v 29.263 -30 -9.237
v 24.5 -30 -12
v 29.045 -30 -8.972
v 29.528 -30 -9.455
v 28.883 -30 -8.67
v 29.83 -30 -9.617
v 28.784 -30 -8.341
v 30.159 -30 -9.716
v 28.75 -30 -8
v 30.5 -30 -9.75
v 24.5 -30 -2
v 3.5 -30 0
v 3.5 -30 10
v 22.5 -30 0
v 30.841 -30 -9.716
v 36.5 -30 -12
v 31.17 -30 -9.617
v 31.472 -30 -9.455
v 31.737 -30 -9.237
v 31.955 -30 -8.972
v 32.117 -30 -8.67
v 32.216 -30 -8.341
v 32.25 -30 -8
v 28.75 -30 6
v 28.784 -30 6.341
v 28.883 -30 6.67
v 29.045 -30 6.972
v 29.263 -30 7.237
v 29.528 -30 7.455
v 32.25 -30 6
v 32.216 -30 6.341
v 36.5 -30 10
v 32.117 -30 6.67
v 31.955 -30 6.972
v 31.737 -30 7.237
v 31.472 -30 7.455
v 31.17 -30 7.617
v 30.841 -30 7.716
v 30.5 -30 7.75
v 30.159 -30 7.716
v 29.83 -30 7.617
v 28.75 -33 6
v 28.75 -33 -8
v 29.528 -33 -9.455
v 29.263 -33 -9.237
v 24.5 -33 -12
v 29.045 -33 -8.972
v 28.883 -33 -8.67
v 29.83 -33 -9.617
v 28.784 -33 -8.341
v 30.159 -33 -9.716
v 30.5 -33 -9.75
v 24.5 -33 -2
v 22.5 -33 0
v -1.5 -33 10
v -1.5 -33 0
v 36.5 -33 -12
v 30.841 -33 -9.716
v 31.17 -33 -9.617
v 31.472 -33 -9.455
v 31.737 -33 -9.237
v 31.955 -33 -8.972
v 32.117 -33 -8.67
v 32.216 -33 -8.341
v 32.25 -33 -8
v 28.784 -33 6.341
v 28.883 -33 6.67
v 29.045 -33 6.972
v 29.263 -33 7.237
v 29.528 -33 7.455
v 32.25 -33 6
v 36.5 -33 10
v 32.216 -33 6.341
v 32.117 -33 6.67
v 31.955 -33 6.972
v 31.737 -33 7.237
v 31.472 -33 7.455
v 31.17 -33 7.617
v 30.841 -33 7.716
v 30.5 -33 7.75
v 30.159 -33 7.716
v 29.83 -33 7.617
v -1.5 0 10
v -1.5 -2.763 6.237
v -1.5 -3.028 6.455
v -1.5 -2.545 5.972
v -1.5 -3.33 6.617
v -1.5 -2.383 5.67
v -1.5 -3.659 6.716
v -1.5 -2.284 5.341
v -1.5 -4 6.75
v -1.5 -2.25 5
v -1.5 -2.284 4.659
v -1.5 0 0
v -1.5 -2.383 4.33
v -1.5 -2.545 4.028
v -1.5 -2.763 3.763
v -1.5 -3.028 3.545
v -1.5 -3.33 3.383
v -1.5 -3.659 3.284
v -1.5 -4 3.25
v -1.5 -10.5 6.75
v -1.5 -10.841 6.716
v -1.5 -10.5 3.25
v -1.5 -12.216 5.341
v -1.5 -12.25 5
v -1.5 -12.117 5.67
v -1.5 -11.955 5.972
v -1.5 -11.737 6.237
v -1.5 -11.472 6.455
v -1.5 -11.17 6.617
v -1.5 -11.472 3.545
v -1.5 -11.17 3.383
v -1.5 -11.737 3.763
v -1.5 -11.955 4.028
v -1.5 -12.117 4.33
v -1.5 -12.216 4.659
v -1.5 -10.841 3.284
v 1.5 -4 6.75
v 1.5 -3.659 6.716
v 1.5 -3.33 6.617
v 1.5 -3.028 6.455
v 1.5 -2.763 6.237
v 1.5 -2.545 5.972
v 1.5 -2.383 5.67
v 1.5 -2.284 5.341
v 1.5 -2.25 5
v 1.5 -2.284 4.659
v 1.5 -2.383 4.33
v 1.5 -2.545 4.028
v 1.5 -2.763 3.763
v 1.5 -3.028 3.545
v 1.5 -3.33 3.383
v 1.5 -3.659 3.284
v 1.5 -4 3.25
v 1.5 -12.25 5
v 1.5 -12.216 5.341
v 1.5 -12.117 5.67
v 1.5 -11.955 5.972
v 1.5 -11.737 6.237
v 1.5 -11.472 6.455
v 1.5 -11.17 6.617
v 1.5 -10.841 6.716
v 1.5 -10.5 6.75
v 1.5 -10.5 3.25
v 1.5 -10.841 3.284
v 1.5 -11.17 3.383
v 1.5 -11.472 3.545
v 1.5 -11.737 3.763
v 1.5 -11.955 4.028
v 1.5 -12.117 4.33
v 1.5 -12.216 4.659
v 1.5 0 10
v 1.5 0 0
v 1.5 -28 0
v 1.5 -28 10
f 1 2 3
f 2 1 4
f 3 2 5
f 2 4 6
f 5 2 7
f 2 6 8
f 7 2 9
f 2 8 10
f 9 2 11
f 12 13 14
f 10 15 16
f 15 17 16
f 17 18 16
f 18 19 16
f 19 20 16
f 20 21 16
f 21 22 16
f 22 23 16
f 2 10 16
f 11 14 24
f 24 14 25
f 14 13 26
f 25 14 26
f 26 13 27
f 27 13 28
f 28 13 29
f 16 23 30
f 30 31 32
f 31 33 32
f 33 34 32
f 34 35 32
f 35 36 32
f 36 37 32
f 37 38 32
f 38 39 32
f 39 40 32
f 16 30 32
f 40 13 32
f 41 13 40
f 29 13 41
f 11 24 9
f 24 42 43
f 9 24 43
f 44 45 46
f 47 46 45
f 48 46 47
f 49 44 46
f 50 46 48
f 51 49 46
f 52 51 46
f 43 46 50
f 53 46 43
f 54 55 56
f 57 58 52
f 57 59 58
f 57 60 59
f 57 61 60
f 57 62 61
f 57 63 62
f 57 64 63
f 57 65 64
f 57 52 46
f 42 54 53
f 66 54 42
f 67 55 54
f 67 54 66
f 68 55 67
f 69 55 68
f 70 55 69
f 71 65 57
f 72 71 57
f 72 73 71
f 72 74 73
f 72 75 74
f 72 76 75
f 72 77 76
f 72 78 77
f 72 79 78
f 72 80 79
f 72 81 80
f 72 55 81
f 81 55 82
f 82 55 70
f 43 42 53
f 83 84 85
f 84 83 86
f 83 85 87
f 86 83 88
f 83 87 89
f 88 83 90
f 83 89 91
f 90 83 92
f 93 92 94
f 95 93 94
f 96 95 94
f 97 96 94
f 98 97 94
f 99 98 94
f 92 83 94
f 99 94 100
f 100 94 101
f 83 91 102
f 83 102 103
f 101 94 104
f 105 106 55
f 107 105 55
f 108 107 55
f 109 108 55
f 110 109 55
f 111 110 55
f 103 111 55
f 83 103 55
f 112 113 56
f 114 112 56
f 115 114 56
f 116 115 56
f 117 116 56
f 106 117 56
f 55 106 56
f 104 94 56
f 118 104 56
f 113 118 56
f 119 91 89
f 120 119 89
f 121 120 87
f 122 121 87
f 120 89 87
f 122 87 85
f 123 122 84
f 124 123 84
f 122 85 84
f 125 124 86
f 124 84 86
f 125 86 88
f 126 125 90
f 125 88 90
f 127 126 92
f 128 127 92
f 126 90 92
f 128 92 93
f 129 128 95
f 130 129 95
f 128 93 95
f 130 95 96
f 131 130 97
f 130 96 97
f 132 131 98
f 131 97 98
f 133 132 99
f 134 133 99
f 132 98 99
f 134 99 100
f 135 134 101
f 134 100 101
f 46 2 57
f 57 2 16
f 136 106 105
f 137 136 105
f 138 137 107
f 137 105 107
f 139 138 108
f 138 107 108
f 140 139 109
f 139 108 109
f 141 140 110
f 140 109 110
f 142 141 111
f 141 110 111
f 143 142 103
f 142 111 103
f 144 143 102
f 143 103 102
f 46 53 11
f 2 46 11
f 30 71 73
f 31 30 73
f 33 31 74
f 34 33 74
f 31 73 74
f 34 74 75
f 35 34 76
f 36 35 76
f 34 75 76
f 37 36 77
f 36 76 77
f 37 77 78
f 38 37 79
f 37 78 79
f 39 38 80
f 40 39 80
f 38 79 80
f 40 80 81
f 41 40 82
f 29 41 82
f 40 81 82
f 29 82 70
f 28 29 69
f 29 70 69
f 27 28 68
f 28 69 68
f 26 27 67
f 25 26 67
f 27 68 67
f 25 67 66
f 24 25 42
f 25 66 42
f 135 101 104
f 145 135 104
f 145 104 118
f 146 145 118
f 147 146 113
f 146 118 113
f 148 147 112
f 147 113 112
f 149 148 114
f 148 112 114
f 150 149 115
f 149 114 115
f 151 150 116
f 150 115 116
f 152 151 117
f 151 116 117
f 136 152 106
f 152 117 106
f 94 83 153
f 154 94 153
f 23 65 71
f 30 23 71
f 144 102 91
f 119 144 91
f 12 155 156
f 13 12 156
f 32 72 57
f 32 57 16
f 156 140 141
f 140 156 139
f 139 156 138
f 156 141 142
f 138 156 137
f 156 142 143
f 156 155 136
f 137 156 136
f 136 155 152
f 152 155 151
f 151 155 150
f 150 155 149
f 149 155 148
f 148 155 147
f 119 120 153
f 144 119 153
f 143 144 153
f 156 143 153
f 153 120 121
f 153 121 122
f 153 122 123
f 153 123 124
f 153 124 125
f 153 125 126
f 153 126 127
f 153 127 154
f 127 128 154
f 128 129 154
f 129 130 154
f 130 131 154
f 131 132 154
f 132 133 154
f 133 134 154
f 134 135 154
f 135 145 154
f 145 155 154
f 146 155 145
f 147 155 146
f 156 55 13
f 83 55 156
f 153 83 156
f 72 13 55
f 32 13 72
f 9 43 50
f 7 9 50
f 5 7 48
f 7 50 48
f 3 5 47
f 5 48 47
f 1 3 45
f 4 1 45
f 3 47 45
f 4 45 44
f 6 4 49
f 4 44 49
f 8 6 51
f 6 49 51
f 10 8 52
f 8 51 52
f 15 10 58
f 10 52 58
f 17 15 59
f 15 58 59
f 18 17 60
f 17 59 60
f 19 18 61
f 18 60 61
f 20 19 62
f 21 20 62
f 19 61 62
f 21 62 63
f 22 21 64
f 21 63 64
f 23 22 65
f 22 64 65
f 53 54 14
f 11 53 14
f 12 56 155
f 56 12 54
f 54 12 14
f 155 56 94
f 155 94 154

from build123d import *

# Parameters (mm, degrees)
F4_W     = 3
F4_H     = 30
F4_W_2   = 12
F4_H_2   = 3
F5_DEPTH = 10
F0_DEPTH = 12
F2_DEPTH = 38.001
F7_DEPTH = 33.001
F3_SIZE  = 2


# Not quite as in the source:
# - a feature names something its author has since deleted; it is built from what else it names


with BuildPart() as f5:
    # F4 (on Top) → F5 (new body)
    with BuildSketch(Plane.XY):
        with Locations((0, -15)):
            Rectangle(F4_W, F4_H)
        Polygon((1.5, -30), (-1.5, -30), (-1.5, -33), (24.5, -33), (24.5, -30), align=None)
        with Locations((30.5, -31.5)):
            Rectangle(F4_W_2, F4_H_2)
    extrude(amount=F5_DEPTH)

    # F4 (on Top) → F0 (join)
    with BuildSketch(Plane.XY):
        with Locations((30.5, -31.5)):
            Rectangle(F4_W_2, F4_H_2)
    extrude(amount=-F0_DEPTH)

    # F1 (on face) → F2 (cut, through all)
    with BuildSketch(Plane(origin=(-1.5, 0, 0), x_dir=(0, -1, 0), z_dir=(-1, 0, 0))):
        with BuildLine():
            ThreePointArc((4, 3.25), (5.2374368671, 3.7625631329), (5.75, 5))
            ThreePointArc((5.75, 5), (5.2374368671, 6.2374368671), (4, 6.75))
            ThreePointArc((4, 6.75), (2.25, 5), (4, 3.25))
        make_face()
        with BuildLine():
            ThreePointArc((4, 6.75), (5.2374368671, 6.2374368671), (5.75, 5))
            ThreePointArc((5.75, 5), (5.2374368671, 3.7625631329), (4, 3.25))
            Line((4, 3.25), (10.5, 3.25))
            ThreePointArc((10.5, 3.25), (8.75, 5), (10.5, 6.75))
            Line((10.5, 6.75), (4, 6.75))
        make_face()
        with BuildLine():
            ThreePointArc((12.25, 5), (11.7374368671, 6.2374368671), (10.5, 6.75))
            ThreePointArc((10.5, 6.75), (8.75, 5), (10.5, 3.25))
            ThreePointArc((10.5, 3.25), (11.7374368671, 3.7625631329), (12.25, 5))
        make_face()
    extrude(amount=-F2_DEPTH, mode=Mode.SUBTRACT)

    # F6 (on face) → F7 (cut, through all)
    with BuildSketch(Plane.XZ.offset(33)):
        with BuildLine():
            ThreePointArc((28.75, -8), (30.5, -6.25), (32.25, -8))
            Line((32.25, -8), (32.25, 6))
            ThreePointArc((32.25, 6), (30.5, 4.25), (28.75, 6))
            Line((28.75, 6), (28.75, -8))
        make_face()
        with BuildLine():
            ThreePointArc((28.75, -8), (30.5, -9.75), (32.25, -8))
            ThreePointArc((32.25, -8), (30.5, -6.25), (28.75, -8))
        make_face()
        with BuildLine():
            ThreePointArc((28.75, 6), (30.5, 4.25), (32.25, 6))
            ThreePointArc((32.25, 6), (30.5, 7.75), (28.75, 6))
        make_face()
    extrude(amount=-F7_DEPTH, mode=Mode.SUBTRACT)

    # F3
    f3_edges = [f5.edges().sort_by_distance(p)[0] for p in [
        (1.5, -30, 5),
        (24.5, -31.5, 0),
    ]]
    chamfer(f3_edges, length=F3_SIZE)


solid = f5.part
